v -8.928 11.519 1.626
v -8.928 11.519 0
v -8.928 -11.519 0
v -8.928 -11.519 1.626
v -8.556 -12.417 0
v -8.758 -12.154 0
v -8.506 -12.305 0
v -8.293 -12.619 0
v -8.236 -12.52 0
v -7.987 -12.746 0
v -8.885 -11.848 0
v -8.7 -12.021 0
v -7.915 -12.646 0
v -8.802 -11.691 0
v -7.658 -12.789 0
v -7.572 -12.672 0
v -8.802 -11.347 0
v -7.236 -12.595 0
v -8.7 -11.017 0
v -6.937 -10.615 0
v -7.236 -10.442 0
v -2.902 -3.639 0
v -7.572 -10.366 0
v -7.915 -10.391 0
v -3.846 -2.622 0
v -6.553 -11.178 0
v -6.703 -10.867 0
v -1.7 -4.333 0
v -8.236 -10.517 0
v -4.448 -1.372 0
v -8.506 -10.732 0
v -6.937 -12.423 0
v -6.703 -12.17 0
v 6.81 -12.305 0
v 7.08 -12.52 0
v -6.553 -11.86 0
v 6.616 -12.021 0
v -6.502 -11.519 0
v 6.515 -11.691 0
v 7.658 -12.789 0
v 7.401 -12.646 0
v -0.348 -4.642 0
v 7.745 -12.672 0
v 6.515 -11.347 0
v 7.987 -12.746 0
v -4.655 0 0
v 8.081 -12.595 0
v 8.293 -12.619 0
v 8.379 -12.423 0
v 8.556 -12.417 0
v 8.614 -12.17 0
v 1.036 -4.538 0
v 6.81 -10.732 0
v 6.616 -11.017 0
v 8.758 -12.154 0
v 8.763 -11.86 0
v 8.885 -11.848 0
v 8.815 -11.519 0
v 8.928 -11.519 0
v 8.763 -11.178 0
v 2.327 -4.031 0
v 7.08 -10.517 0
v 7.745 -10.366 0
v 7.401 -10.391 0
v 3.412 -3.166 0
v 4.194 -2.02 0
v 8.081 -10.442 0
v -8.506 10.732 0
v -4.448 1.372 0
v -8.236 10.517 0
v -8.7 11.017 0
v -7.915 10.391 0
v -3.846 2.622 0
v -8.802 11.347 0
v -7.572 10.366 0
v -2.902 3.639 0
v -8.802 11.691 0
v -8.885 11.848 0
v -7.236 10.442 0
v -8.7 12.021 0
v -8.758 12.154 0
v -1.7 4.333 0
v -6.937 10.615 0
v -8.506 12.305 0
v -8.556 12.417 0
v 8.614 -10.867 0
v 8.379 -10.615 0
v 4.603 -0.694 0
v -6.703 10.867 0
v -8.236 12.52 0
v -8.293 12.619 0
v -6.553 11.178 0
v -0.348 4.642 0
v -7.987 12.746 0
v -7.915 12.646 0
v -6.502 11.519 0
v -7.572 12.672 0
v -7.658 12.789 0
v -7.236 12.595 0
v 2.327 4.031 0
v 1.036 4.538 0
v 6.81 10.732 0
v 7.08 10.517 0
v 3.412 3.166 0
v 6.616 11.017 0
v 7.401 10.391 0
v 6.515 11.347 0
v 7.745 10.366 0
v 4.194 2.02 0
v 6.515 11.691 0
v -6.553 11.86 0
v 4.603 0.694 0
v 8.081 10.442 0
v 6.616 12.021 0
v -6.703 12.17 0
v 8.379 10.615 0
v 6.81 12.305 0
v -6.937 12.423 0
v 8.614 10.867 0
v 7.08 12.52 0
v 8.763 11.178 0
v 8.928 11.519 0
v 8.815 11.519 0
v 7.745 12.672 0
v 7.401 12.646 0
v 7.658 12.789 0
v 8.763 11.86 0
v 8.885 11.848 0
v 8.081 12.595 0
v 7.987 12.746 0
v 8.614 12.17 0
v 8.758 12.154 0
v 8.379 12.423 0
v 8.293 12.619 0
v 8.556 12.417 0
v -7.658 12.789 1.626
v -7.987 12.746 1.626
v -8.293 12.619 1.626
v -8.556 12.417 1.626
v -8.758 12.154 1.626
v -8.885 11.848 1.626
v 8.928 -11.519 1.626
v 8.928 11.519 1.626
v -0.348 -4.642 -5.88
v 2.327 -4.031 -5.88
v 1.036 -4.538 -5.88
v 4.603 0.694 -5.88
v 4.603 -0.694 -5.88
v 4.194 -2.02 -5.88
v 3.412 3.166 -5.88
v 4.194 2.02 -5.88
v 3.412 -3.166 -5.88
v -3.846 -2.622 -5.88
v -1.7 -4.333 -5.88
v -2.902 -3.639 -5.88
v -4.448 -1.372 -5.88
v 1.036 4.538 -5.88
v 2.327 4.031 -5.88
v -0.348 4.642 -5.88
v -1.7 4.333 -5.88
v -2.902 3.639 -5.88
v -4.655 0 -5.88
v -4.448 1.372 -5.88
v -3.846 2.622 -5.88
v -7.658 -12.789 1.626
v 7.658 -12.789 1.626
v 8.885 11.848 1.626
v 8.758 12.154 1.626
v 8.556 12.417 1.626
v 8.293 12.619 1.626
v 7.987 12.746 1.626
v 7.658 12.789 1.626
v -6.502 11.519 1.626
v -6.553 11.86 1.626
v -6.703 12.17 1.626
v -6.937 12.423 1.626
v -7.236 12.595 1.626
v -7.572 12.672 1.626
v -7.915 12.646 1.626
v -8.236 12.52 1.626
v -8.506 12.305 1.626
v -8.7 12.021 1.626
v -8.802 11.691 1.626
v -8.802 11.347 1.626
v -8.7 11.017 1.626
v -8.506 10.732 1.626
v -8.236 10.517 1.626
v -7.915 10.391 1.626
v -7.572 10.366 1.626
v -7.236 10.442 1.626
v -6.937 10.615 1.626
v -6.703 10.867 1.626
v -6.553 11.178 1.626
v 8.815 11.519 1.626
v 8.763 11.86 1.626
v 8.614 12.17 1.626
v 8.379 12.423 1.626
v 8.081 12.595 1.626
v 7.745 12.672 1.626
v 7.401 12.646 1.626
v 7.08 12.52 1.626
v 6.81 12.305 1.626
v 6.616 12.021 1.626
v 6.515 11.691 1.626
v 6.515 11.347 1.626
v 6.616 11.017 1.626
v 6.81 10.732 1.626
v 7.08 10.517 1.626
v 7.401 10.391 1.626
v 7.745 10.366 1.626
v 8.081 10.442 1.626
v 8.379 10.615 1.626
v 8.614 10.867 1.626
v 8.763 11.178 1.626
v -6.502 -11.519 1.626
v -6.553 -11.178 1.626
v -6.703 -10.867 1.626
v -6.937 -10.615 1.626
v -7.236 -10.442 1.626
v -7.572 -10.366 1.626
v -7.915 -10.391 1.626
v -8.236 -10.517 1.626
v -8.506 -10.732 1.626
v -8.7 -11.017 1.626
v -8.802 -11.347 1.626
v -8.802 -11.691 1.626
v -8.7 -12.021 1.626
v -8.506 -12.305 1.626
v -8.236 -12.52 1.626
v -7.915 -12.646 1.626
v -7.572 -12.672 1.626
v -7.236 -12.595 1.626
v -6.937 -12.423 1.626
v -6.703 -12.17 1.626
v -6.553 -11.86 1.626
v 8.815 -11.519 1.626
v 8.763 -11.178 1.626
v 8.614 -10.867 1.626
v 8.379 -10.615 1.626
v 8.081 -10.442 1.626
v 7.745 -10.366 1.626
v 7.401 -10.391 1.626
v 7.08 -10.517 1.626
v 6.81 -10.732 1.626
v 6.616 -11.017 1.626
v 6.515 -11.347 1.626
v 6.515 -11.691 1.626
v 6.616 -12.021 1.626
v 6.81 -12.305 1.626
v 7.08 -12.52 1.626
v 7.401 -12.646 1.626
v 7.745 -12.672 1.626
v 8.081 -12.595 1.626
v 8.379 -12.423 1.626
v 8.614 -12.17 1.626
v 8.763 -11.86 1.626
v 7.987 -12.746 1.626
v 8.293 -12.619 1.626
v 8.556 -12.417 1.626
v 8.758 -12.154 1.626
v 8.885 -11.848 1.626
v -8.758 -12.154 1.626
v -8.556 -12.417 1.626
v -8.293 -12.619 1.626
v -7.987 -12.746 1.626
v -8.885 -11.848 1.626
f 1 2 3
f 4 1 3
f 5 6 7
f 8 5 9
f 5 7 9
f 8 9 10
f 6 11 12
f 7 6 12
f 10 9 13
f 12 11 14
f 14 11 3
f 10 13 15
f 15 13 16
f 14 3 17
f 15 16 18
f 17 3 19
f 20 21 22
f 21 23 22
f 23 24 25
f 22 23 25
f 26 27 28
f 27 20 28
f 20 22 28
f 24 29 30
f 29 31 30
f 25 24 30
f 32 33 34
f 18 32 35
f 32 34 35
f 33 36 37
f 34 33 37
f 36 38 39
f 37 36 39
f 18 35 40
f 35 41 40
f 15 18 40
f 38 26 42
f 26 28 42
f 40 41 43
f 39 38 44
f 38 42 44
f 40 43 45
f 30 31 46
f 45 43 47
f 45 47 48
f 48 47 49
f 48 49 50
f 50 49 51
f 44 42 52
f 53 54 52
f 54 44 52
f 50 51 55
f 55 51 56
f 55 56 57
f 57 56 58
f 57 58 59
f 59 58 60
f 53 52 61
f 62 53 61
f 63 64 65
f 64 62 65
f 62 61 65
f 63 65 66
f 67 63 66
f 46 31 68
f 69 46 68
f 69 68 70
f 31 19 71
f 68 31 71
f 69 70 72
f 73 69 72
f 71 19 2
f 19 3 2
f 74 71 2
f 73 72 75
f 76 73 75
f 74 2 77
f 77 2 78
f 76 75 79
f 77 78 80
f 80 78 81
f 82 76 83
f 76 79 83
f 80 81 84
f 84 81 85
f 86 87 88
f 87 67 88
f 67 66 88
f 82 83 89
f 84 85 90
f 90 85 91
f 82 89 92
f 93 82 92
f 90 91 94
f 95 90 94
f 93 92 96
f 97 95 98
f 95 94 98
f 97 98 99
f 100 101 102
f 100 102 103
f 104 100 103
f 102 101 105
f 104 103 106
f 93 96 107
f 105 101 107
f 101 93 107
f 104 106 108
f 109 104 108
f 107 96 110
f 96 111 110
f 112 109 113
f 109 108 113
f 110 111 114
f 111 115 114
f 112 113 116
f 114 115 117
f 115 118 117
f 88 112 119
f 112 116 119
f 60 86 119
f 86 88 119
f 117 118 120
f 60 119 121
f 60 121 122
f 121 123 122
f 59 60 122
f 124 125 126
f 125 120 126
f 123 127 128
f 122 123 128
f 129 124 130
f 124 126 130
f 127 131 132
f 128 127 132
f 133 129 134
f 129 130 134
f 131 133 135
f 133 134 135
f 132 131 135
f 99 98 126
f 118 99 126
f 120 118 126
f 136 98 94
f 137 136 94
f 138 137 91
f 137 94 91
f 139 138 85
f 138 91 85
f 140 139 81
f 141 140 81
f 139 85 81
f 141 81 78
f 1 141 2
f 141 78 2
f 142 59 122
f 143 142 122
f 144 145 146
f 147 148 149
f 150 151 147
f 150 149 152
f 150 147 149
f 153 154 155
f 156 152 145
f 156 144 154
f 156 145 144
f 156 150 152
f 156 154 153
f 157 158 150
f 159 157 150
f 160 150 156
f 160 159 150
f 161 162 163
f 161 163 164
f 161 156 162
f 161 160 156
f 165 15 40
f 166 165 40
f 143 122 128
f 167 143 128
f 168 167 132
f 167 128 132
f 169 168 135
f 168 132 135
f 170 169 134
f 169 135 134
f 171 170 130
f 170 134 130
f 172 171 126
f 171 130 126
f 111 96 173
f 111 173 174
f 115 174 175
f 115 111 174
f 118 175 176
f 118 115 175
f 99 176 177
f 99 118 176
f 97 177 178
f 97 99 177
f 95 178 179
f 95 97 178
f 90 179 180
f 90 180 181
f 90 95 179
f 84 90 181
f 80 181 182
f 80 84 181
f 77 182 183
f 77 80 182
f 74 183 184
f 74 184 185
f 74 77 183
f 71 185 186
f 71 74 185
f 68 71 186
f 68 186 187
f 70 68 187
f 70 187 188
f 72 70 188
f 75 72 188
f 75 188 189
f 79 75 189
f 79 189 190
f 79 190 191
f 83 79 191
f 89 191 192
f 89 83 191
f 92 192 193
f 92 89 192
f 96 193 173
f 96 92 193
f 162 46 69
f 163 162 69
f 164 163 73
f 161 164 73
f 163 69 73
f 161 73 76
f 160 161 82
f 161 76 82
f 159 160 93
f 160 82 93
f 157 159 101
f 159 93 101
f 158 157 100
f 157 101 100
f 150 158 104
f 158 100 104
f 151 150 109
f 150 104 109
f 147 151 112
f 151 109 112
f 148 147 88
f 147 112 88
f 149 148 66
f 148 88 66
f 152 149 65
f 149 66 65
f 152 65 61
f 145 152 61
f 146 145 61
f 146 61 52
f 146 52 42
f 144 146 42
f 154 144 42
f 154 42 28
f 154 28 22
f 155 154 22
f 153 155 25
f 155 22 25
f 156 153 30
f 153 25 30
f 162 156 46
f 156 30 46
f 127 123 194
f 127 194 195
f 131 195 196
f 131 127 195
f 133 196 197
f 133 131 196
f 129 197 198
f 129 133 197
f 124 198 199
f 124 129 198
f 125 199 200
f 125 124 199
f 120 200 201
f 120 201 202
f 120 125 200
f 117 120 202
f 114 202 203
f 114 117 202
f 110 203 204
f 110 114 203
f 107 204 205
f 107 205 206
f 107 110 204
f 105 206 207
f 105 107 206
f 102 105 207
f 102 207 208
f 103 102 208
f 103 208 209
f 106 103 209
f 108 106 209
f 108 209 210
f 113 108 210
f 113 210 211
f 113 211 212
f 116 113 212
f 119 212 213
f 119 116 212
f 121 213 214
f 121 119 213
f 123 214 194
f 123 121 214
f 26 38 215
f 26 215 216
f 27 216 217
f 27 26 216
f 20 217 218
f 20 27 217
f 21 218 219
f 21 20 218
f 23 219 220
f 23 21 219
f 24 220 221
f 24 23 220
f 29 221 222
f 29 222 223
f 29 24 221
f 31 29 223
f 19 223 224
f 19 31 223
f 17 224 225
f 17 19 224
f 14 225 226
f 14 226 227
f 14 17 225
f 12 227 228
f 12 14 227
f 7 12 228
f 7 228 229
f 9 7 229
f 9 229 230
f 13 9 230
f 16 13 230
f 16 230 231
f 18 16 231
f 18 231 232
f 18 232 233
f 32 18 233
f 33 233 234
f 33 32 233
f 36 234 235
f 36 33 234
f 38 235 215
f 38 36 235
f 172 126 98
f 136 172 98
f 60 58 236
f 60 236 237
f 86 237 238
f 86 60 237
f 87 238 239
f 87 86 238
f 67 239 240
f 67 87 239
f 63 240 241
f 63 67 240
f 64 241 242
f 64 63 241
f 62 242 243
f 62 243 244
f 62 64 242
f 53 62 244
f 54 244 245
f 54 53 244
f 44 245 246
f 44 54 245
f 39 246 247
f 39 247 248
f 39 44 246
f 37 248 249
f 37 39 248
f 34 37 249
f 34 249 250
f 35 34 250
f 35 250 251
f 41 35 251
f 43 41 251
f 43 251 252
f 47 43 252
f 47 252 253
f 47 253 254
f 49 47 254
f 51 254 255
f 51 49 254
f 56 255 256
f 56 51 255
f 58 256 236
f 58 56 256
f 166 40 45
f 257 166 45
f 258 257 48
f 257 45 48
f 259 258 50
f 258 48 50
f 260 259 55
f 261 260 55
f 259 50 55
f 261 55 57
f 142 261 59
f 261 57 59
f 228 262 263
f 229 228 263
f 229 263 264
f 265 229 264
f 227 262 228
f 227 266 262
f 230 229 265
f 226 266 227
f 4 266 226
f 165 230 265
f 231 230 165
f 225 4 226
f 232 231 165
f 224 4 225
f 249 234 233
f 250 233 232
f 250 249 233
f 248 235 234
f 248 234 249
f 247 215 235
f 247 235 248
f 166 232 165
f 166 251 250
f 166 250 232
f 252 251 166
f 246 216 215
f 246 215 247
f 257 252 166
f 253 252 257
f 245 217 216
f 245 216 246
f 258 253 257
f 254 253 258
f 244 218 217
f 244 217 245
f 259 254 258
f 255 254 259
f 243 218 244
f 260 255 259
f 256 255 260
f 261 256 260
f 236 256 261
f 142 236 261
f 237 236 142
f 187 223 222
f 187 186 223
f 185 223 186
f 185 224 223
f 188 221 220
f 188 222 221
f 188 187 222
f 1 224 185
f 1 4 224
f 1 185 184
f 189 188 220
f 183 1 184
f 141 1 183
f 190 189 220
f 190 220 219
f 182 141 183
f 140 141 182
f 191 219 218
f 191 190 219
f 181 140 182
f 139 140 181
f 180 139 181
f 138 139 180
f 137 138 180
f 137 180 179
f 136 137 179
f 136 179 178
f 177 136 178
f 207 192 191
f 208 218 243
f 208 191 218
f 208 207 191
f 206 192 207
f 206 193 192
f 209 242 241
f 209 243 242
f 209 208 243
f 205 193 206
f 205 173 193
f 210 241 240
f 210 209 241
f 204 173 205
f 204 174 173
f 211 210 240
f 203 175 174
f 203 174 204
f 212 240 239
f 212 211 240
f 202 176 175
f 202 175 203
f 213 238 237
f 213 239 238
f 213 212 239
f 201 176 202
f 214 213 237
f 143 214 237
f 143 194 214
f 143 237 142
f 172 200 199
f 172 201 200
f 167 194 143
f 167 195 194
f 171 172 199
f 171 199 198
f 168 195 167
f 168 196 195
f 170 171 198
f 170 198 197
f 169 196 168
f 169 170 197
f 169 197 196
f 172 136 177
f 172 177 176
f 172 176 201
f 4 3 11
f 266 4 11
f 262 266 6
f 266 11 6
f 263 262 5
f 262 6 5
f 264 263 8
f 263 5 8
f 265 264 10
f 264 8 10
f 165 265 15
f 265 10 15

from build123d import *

# Parameters (mm, degrees)
SKETCH2_R           = 1.156401536
BOSS_EXTRUDE1_DEPTH = 1.6256
SKETCH3_R           = 4.65455
BOSS_EXTRUDE2_DEPTH = 5.8801


with BuildPart() as part:
    # Sketch2 → Boss-Extrude1 (new body)
    with BuildSketch(Plane.XY):
        with BuildLine():
            Line((-7.6581, -12.7889), (7.6581, -12.7889))
            ThreePointArc((7.6581, -12.7889), (8.556125612, -12.416925612), (8.9281, -11.5189))
            Line((8.9281, -11.5189), (8.9281, 11.5189))
            ThreePointArc((8.9281, 11.5189), (8.556125612, 12.416925612), (7.6581, 12.7889))
            Line((7.6581, 12.7889), (-7.6581, 12.7889))
            ThreePointArc((-7.6581, 12.7889), (-8.556125612, 12.416925612), (-8.9281, 11.5189))
            Line((-8.9281, 11.5189), (-8.9281, -11.5189))
            ThreePointArc((-8.9281, -11.5189), (-8.556125612, -12.416925612), (-7.6581, -12.7889))
        make_face()
        with Locations((7.6581, 11.5189)):
            Circle(SKETCH2_R, mode=Mode.SUBTRACT)
        with Locations((-7.6581, 11.5189)):
            Circle(SKETCH2_R, mode=Mode.SUBTRACT)
        with Locations((7.6581, -11.5189)):
            Circle(SKETCH2_R, mode=Mode.SUBTRACT)
        with Locations((-7.6581, -11.5189)):
            Circle(SKETCH2_R, mode=Mode.SUBTRACT)
    extrude(amount=BOSS_EXTRUDE1_DEPTH)

    # Sketch3 → Boss-Extrude2 (add)
    with BuildSketch(Plane(origin=(0, 0, 0), x_dir=(-1, 0, 0), z_dir=(0, 0, -1))):
        Circle(SKETCH3_R)
    extrude(amount=BOSS_EXTRUDE2_DEPTH)


solid = part.part
